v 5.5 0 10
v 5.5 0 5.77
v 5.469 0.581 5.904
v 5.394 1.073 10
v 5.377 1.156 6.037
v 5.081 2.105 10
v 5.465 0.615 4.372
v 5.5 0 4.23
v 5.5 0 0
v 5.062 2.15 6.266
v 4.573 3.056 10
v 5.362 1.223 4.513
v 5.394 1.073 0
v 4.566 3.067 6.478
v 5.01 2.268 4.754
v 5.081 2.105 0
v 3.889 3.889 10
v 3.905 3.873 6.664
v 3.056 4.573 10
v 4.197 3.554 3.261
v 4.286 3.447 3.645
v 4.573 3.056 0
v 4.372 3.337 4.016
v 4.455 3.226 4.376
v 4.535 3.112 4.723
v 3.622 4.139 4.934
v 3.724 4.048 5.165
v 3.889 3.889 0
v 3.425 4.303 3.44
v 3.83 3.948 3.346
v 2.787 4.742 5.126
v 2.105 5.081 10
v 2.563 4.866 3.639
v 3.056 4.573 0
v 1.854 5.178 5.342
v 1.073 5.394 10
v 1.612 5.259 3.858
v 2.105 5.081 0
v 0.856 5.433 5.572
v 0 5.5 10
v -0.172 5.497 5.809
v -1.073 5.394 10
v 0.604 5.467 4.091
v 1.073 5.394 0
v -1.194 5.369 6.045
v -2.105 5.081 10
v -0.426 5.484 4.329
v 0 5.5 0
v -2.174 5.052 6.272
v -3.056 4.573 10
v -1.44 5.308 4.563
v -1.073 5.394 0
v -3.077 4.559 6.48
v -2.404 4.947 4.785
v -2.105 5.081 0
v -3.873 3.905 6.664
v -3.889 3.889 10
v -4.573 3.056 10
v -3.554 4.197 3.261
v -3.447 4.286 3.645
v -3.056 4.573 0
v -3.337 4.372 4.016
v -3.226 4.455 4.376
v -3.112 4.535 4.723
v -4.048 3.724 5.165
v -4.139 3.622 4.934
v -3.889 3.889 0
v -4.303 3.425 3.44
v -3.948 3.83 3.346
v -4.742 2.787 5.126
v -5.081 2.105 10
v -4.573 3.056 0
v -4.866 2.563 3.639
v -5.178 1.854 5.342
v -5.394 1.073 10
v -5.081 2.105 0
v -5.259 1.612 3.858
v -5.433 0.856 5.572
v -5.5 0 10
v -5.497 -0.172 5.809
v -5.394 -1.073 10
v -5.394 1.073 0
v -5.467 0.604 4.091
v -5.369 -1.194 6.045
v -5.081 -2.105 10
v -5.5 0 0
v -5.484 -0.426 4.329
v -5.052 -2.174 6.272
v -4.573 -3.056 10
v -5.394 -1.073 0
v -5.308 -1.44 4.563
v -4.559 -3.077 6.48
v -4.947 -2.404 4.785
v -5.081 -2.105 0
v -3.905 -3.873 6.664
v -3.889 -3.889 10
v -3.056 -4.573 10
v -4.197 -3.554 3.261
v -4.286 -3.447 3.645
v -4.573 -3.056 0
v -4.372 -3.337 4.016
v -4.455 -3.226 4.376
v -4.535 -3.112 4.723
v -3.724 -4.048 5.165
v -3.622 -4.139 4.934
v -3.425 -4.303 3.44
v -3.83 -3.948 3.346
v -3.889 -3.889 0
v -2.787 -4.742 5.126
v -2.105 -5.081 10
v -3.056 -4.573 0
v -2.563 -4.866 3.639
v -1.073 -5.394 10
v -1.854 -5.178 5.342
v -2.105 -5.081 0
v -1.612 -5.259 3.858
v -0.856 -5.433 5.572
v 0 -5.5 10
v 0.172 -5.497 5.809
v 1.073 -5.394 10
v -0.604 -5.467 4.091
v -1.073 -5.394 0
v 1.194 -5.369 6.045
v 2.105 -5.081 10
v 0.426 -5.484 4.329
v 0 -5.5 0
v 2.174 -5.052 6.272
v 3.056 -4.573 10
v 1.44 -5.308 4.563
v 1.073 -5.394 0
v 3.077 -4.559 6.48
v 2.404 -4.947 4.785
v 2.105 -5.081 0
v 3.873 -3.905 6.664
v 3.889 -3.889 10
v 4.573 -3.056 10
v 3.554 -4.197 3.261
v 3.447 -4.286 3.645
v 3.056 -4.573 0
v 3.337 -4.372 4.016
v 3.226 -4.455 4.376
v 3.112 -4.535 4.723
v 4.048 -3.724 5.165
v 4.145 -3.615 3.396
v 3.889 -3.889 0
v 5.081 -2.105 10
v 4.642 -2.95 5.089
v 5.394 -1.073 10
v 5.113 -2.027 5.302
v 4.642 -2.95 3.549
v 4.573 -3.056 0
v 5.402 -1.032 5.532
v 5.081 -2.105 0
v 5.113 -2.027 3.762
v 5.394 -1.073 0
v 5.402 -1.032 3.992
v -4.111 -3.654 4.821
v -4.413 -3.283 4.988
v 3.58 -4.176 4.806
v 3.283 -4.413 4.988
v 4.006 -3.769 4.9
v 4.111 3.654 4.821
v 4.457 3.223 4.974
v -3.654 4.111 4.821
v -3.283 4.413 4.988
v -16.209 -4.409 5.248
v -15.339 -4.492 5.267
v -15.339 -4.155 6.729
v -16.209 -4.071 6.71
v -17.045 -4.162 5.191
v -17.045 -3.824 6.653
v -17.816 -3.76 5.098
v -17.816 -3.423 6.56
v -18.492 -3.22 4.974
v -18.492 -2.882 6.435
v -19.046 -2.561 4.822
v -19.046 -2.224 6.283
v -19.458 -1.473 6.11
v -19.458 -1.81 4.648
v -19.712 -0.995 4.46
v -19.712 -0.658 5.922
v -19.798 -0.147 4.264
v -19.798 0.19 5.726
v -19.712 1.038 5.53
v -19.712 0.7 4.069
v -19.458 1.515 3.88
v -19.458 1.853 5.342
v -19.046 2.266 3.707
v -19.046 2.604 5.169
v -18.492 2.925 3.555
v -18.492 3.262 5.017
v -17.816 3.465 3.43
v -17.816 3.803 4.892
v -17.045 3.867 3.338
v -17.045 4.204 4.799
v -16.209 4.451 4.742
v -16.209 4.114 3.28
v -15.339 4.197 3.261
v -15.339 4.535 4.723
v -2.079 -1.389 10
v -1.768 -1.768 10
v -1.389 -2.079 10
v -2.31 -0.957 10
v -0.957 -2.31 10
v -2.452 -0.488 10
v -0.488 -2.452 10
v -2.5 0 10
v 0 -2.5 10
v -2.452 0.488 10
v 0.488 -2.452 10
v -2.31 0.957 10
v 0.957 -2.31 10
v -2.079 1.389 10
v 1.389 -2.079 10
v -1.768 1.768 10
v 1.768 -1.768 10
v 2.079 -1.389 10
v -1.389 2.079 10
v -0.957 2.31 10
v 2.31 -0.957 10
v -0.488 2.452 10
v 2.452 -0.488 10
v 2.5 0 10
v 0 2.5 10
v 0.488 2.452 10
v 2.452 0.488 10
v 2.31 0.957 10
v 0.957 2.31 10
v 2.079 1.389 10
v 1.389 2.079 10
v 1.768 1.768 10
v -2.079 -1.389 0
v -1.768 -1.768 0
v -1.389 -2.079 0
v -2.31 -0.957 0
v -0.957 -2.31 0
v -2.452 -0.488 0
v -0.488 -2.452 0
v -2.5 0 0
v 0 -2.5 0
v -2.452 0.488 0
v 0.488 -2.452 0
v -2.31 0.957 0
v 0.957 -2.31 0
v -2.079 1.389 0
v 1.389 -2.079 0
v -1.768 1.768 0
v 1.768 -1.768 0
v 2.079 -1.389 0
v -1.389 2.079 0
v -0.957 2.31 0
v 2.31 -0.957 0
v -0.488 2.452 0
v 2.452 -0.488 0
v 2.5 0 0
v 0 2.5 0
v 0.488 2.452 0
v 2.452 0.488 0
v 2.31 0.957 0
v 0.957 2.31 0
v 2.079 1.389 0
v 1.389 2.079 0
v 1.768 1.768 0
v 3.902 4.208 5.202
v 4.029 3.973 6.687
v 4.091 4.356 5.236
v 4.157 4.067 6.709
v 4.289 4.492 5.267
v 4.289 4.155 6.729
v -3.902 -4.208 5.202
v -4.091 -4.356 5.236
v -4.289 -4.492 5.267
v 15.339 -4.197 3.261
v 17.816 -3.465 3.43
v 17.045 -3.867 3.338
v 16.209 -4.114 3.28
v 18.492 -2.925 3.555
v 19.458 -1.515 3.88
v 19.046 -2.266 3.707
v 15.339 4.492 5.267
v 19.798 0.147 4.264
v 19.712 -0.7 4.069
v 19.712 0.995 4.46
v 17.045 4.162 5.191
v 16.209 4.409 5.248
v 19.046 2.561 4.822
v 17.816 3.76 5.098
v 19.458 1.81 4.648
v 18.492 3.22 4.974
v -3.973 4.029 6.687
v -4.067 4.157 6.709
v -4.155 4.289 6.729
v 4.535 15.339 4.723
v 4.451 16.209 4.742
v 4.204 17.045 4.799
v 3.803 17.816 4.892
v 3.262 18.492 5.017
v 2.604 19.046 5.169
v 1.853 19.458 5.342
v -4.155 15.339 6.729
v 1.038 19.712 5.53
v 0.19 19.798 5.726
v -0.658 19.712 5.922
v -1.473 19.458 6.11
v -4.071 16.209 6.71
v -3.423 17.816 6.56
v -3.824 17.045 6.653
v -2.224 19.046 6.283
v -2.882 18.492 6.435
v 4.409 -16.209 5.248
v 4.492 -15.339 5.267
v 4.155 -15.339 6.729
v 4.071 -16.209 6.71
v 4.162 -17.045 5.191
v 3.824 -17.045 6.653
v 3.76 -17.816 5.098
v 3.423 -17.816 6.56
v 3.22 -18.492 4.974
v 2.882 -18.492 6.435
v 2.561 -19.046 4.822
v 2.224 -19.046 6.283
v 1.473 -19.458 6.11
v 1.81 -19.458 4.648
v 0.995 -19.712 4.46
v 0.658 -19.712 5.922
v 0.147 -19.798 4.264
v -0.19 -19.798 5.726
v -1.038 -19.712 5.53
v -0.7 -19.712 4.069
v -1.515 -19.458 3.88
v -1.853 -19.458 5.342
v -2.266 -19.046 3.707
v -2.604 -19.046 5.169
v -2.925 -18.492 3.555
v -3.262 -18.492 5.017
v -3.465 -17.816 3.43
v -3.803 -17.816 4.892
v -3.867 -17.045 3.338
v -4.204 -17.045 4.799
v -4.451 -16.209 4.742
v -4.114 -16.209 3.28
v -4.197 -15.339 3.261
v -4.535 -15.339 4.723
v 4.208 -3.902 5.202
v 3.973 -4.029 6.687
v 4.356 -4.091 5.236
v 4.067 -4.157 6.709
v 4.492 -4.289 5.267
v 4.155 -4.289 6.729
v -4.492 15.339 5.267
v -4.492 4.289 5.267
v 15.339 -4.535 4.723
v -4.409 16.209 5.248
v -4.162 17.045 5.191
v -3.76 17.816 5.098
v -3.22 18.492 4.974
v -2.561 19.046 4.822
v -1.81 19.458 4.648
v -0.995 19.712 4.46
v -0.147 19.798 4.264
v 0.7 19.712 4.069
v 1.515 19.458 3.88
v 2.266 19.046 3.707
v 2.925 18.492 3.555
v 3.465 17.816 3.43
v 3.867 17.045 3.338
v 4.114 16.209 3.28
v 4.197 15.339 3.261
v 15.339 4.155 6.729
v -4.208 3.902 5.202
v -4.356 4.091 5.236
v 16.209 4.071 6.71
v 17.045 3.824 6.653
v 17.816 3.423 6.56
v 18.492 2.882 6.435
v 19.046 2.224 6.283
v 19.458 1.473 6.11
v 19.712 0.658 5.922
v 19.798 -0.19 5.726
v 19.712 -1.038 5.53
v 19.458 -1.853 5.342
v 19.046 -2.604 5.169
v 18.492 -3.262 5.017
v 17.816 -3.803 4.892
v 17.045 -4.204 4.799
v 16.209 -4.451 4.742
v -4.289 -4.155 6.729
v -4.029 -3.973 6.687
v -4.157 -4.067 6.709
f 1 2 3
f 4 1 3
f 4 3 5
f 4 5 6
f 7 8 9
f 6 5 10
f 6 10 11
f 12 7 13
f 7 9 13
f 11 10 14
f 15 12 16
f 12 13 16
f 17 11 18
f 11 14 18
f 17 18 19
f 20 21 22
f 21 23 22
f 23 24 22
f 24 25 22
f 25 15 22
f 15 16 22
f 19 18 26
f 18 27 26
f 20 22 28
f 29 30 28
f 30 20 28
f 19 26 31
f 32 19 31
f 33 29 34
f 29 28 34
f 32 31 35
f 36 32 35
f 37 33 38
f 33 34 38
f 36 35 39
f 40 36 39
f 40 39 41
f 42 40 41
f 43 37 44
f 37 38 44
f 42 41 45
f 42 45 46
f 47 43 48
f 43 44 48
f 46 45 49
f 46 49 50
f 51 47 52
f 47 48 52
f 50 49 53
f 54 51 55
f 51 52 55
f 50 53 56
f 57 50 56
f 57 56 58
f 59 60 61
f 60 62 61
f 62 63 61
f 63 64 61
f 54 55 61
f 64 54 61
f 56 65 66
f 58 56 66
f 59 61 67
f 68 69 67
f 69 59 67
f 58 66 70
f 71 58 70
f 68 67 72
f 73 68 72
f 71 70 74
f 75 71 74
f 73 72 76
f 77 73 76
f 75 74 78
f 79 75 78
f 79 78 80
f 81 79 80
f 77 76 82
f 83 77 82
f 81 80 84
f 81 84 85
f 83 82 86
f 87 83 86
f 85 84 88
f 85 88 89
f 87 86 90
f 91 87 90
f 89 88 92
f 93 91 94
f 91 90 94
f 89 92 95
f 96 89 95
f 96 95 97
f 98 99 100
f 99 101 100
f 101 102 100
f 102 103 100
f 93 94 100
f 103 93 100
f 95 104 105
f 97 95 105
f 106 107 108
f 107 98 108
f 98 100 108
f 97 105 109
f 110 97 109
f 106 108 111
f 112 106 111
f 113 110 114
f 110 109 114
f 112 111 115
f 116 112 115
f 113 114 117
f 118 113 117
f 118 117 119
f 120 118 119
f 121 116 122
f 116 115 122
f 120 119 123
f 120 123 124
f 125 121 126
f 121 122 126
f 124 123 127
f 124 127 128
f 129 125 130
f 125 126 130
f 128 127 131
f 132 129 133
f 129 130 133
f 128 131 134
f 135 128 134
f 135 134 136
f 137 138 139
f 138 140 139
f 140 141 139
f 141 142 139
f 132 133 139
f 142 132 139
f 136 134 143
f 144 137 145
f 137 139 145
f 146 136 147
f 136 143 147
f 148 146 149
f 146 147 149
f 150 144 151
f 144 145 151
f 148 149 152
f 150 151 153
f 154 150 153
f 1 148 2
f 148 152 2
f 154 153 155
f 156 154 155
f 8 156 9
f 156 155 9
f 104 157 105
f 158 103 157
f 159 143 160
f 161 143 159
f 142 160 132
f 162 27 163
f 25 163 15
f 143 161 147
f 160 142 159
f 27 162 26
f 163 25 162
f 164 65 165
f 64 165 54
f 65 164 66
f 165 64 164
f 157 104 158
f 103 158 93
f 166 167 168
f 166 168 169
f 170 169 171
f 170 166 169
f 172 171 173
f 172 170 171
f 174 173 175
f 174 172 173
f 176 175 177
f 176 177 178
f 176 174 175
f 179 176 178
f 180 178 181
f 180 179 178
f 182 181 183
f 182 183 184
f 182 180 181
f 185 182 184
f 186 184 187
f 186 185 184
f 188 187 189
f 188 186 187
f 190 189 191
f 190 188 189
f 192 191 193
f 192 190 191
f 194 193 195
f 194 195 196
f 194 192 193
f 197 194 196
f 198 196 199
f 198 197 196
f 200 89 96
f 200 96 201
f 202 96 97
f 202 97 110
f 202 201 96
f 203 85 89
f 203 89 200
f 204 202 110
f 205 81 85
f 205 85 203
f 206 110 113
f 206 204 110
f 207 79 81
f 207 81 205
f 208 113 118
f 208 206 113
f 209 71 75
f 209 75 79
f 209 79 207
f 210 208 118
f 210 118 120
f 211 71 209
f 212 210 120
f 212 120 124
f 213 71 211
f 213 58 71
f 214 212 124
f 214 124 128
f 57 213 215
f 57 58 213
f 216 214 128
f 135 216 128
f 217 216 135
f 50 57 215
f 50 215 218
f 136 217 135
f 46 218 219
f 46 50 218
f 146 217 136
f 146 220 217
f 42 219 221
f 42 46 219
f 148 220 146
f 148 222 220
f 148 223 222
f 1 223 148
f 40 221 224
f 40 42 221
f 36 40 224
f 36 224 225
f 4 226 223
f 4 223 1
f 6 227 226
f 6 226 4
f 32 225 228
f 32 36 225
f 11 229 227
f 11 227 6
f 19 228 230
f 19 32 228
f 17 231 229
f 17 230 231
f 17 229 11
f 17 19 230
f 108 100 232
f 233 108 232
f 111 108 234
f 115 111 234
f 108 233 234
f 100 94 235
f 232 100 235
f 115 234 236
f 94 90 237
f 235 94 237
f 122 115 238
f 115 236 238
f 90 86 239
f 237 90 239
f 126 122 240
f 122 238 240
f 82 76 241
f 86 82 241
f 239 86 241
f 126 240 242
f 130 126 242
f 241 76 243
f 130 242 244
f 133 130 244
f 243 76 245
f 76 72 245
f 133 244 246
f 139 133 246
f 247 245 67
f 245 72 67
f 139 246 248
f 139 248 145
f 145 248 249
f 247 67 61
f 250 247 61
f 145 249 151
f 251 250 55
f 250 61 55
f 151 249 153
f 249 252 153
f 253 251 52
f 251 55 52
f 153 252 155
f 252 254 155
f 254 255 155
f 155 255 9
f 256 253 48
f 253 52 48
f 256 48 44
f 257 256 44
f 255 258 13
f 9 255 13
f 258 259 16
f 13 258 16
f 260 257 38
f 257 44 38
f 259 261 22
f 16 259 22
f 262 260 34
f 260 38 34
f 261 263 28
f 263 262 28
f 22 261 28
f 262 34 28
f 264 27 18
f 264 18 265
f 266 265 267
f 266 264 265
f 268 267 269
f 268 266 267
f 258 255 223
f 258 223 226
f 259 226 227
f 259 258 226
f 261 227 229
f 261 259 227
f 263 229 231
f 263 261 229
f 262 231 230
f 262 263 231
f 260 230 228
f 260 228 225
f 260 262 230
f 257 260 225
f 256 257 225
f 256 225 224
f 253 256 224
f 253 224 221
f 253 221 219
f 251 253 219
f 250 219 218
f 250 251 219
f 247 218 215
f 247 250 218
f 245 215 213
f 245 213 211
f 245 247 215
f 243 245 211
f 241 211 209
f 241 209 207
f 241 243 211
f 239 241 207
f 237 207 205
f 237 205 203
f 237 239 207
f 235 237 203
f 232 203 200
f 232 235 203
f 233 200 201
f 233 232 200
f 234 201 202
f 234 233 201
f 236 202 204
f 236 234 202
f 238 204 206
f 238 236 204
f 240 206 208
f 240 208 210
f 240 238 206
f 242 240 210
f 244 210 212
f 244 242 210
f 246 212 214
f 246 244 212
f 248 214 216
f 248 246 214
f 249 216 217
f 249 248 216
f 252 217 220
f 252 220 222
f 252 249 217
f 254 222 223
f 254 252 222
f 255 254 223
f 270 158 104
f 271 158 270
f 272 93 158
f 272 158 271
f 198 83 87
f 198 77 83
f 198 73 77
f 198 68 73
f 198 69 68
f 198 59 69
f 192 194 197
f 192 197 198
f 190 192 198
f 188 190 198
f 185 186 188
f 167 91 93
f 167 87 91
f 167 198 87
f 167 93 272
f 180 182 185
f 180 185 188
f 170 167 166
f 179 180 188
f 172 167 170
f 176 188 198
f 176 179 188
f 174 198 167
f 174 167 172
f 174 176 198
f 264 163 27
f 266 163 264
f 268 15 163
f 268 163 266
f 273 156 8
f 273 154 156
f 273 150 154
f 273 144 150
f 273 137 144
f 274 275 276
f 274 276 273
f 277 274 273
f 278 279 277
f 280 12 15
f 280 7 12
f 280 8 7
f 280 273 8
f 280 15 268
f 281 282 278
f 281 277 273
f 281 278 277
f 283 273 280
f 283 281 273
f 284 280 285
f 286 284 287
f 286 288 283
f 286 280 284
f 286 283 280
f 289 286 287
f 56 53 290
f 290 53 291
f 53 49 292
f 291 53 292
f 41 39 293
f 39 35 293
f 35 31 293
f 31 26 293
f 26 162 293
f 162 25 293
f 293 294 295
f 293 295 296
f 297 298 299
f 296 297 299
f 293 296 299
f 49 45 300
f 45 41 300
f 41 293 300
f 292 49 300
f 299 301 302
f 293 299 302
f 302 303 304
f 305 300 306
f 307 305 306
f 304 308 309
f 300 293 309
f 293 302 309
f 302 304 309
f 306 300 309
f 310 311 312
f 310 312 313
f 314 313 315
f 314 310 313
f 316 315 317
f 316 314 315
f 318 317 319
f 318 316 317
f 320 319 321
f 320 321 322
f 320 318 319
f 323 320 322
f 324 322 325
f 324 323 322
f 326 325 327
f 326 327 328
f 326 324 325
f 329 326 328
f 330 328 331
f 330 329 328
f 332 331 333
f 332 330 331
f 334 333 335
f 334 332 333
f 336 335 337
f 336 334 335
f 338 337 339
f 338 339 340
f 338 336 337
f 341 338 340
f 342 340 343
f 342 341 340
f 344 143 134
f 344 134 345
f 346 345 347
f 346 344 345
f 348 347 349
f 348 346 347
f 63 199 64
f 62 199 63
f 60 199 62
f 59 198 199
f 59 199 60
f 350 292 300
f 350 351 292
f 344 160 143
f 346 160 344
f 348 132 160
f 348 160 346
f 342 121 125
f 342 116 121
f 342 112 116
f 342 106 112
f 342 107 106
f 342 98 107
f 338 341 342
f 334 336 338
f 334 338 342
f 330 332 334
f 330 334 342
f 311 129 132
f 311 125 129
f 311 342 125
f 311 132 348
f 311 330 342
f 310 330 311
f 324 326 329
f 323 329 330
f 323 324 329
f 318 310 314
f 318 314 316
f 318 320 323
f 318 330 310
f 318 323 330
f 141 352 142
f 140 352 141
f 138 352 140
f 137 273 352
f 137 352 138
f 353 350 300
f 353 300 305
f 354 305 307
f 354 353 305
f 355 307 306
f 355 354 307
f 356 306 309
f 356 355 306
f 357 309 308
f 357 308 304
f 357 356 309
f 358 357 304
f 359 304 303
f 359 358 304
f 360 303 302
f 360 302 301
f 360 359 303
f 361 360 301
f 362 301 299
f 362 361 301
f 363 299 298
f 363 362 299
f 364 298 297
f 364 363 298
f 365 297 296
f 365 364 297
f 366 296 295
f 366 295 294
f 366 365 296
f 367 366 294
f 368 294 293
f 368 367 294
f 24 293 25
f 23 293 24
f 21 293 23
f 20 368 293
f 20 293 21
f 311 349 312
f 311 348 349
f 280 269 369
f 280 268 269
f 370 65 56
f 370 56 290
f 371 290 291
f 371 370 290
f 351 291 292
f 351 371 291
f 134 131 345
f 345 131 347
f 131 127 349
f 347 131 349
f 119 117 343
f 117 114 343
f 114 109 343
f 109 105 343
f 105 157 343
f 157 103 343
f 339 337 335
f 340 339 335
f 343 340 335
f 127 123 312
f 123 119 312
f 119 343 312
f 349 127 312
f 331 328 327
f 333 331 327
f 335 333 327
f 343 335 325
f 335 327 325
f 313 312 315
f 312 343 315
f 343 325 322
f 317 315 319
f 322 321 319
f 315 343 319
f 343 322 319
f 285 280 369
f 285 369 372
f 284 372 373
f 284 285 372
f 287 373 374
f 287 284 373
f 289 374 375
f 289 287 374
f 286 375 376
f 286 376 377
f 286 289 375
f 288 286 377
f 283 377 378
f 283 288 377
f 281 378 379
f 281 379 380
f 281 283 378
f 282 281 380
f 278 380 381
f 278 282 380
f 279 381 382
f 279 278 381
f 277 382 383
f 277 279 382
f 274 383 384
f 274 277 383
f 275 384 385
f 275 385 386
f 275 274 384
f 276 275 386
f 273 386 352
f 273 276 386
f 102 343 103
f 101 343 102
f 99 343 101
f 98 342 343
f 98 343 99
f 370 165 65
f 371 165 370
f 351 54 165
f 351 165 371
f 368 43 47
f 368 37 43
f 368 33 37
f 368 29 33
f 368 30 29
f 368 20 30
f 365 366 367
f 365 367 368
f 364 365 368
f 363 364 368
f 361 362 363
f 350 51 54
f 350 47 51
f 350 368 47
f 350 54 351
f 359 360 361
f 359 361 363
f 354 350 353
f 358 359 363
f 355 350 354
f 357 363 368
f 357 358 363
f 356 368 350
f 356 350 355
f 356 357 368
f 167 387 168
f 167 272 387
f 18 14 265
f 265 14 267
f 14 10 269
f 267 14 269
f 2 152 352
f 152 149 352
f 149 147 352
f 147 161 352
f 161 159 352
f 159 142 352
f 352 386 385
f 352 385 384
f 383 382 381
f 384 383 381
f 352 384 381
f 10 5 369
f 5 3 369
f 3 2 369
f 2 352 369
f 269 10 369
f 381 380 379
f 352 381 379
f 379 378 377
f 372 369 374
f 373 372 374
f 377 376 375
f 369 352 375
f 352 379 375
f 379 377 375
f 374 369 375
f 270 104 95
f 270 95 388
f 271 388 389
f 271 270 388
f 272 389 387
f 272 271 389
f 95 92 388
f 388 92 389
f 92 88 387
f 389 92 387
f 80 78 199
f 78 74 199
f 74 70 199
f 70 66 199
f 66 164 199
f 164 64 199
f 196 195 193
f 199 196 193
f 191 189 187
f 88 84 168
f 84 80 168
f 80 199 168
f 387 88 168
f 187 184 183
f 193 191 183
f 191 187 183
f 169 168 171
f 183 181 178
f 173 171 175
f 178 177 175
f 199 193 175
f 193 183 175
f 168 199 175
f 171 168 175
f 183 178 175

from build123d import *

# Parameters (mm, degrees)
SKETCH2_R           = 5.5
SKETCH2_R_2         = 2.5
BOSS_EXTRUDE1_DEPTH = 10
BOSS_EXTRUDE2_DEPTH = 0.75
CIRPATTERN1_COUNT   = 4


with BuildPart() as part:
    # Sketch2 → Boss-Extrude1 (new body)
    with BuildSketch(Plane.XY):
        Circle(SKETCH2_R)
        Circle(SKETCH2_R_2, mode=Mode.SUBTRACT)
    extrude(amount=BOSS_EXTRUDE1_DEPTH)

    # Sketch4 → Boss-Extrude2 (add, symmetric)
    with BuildSketch(Plane(origin=(0, -1.095927867, 4.746985116), x_dir=(0, 0.9743700647852367, 0.22495105434385892), z_dir=(0, 0.22495105434385892, -0.9743700647852367))):
        with BuildLine():
            Line((5.562035005, 4.289362297), (5.562035005, 15.338741246))
            ThreePointArc((5.562035005, 15.338741246), (1.102910343, 19.797865908), (-3.356214318, 15.338741246))
            Line((-3.356214318, 15.338741246), (-3.356214318, 3.072229714))
            ThreePointArc((-3.356214318, 3.072229714), (-1.450852963, 3.954597536), (0.520369242, 3.231231872))
            ThreePointArc((0.520369242, 3.231231872), (3.26034811, 2.716133916), (5.562035005, 4.289362297))
        make_face()
    boss_extrude2 = extrude(amount=BOSS_EXTRUDE2_DEPTH, both=True)

    # CirPattern1: Boss-Extrude2 ×4 about axis
    cirpattern1_axis = Axis((0, 0, 0), (0, 0, 1))
    for i in range(1, CIRPATTERN1_COUNT):
        add(boss_extrude2.rotate(cirpattern1_axis, i * 360 / CIRPATTERN1_COUNT))


solid = part.part
